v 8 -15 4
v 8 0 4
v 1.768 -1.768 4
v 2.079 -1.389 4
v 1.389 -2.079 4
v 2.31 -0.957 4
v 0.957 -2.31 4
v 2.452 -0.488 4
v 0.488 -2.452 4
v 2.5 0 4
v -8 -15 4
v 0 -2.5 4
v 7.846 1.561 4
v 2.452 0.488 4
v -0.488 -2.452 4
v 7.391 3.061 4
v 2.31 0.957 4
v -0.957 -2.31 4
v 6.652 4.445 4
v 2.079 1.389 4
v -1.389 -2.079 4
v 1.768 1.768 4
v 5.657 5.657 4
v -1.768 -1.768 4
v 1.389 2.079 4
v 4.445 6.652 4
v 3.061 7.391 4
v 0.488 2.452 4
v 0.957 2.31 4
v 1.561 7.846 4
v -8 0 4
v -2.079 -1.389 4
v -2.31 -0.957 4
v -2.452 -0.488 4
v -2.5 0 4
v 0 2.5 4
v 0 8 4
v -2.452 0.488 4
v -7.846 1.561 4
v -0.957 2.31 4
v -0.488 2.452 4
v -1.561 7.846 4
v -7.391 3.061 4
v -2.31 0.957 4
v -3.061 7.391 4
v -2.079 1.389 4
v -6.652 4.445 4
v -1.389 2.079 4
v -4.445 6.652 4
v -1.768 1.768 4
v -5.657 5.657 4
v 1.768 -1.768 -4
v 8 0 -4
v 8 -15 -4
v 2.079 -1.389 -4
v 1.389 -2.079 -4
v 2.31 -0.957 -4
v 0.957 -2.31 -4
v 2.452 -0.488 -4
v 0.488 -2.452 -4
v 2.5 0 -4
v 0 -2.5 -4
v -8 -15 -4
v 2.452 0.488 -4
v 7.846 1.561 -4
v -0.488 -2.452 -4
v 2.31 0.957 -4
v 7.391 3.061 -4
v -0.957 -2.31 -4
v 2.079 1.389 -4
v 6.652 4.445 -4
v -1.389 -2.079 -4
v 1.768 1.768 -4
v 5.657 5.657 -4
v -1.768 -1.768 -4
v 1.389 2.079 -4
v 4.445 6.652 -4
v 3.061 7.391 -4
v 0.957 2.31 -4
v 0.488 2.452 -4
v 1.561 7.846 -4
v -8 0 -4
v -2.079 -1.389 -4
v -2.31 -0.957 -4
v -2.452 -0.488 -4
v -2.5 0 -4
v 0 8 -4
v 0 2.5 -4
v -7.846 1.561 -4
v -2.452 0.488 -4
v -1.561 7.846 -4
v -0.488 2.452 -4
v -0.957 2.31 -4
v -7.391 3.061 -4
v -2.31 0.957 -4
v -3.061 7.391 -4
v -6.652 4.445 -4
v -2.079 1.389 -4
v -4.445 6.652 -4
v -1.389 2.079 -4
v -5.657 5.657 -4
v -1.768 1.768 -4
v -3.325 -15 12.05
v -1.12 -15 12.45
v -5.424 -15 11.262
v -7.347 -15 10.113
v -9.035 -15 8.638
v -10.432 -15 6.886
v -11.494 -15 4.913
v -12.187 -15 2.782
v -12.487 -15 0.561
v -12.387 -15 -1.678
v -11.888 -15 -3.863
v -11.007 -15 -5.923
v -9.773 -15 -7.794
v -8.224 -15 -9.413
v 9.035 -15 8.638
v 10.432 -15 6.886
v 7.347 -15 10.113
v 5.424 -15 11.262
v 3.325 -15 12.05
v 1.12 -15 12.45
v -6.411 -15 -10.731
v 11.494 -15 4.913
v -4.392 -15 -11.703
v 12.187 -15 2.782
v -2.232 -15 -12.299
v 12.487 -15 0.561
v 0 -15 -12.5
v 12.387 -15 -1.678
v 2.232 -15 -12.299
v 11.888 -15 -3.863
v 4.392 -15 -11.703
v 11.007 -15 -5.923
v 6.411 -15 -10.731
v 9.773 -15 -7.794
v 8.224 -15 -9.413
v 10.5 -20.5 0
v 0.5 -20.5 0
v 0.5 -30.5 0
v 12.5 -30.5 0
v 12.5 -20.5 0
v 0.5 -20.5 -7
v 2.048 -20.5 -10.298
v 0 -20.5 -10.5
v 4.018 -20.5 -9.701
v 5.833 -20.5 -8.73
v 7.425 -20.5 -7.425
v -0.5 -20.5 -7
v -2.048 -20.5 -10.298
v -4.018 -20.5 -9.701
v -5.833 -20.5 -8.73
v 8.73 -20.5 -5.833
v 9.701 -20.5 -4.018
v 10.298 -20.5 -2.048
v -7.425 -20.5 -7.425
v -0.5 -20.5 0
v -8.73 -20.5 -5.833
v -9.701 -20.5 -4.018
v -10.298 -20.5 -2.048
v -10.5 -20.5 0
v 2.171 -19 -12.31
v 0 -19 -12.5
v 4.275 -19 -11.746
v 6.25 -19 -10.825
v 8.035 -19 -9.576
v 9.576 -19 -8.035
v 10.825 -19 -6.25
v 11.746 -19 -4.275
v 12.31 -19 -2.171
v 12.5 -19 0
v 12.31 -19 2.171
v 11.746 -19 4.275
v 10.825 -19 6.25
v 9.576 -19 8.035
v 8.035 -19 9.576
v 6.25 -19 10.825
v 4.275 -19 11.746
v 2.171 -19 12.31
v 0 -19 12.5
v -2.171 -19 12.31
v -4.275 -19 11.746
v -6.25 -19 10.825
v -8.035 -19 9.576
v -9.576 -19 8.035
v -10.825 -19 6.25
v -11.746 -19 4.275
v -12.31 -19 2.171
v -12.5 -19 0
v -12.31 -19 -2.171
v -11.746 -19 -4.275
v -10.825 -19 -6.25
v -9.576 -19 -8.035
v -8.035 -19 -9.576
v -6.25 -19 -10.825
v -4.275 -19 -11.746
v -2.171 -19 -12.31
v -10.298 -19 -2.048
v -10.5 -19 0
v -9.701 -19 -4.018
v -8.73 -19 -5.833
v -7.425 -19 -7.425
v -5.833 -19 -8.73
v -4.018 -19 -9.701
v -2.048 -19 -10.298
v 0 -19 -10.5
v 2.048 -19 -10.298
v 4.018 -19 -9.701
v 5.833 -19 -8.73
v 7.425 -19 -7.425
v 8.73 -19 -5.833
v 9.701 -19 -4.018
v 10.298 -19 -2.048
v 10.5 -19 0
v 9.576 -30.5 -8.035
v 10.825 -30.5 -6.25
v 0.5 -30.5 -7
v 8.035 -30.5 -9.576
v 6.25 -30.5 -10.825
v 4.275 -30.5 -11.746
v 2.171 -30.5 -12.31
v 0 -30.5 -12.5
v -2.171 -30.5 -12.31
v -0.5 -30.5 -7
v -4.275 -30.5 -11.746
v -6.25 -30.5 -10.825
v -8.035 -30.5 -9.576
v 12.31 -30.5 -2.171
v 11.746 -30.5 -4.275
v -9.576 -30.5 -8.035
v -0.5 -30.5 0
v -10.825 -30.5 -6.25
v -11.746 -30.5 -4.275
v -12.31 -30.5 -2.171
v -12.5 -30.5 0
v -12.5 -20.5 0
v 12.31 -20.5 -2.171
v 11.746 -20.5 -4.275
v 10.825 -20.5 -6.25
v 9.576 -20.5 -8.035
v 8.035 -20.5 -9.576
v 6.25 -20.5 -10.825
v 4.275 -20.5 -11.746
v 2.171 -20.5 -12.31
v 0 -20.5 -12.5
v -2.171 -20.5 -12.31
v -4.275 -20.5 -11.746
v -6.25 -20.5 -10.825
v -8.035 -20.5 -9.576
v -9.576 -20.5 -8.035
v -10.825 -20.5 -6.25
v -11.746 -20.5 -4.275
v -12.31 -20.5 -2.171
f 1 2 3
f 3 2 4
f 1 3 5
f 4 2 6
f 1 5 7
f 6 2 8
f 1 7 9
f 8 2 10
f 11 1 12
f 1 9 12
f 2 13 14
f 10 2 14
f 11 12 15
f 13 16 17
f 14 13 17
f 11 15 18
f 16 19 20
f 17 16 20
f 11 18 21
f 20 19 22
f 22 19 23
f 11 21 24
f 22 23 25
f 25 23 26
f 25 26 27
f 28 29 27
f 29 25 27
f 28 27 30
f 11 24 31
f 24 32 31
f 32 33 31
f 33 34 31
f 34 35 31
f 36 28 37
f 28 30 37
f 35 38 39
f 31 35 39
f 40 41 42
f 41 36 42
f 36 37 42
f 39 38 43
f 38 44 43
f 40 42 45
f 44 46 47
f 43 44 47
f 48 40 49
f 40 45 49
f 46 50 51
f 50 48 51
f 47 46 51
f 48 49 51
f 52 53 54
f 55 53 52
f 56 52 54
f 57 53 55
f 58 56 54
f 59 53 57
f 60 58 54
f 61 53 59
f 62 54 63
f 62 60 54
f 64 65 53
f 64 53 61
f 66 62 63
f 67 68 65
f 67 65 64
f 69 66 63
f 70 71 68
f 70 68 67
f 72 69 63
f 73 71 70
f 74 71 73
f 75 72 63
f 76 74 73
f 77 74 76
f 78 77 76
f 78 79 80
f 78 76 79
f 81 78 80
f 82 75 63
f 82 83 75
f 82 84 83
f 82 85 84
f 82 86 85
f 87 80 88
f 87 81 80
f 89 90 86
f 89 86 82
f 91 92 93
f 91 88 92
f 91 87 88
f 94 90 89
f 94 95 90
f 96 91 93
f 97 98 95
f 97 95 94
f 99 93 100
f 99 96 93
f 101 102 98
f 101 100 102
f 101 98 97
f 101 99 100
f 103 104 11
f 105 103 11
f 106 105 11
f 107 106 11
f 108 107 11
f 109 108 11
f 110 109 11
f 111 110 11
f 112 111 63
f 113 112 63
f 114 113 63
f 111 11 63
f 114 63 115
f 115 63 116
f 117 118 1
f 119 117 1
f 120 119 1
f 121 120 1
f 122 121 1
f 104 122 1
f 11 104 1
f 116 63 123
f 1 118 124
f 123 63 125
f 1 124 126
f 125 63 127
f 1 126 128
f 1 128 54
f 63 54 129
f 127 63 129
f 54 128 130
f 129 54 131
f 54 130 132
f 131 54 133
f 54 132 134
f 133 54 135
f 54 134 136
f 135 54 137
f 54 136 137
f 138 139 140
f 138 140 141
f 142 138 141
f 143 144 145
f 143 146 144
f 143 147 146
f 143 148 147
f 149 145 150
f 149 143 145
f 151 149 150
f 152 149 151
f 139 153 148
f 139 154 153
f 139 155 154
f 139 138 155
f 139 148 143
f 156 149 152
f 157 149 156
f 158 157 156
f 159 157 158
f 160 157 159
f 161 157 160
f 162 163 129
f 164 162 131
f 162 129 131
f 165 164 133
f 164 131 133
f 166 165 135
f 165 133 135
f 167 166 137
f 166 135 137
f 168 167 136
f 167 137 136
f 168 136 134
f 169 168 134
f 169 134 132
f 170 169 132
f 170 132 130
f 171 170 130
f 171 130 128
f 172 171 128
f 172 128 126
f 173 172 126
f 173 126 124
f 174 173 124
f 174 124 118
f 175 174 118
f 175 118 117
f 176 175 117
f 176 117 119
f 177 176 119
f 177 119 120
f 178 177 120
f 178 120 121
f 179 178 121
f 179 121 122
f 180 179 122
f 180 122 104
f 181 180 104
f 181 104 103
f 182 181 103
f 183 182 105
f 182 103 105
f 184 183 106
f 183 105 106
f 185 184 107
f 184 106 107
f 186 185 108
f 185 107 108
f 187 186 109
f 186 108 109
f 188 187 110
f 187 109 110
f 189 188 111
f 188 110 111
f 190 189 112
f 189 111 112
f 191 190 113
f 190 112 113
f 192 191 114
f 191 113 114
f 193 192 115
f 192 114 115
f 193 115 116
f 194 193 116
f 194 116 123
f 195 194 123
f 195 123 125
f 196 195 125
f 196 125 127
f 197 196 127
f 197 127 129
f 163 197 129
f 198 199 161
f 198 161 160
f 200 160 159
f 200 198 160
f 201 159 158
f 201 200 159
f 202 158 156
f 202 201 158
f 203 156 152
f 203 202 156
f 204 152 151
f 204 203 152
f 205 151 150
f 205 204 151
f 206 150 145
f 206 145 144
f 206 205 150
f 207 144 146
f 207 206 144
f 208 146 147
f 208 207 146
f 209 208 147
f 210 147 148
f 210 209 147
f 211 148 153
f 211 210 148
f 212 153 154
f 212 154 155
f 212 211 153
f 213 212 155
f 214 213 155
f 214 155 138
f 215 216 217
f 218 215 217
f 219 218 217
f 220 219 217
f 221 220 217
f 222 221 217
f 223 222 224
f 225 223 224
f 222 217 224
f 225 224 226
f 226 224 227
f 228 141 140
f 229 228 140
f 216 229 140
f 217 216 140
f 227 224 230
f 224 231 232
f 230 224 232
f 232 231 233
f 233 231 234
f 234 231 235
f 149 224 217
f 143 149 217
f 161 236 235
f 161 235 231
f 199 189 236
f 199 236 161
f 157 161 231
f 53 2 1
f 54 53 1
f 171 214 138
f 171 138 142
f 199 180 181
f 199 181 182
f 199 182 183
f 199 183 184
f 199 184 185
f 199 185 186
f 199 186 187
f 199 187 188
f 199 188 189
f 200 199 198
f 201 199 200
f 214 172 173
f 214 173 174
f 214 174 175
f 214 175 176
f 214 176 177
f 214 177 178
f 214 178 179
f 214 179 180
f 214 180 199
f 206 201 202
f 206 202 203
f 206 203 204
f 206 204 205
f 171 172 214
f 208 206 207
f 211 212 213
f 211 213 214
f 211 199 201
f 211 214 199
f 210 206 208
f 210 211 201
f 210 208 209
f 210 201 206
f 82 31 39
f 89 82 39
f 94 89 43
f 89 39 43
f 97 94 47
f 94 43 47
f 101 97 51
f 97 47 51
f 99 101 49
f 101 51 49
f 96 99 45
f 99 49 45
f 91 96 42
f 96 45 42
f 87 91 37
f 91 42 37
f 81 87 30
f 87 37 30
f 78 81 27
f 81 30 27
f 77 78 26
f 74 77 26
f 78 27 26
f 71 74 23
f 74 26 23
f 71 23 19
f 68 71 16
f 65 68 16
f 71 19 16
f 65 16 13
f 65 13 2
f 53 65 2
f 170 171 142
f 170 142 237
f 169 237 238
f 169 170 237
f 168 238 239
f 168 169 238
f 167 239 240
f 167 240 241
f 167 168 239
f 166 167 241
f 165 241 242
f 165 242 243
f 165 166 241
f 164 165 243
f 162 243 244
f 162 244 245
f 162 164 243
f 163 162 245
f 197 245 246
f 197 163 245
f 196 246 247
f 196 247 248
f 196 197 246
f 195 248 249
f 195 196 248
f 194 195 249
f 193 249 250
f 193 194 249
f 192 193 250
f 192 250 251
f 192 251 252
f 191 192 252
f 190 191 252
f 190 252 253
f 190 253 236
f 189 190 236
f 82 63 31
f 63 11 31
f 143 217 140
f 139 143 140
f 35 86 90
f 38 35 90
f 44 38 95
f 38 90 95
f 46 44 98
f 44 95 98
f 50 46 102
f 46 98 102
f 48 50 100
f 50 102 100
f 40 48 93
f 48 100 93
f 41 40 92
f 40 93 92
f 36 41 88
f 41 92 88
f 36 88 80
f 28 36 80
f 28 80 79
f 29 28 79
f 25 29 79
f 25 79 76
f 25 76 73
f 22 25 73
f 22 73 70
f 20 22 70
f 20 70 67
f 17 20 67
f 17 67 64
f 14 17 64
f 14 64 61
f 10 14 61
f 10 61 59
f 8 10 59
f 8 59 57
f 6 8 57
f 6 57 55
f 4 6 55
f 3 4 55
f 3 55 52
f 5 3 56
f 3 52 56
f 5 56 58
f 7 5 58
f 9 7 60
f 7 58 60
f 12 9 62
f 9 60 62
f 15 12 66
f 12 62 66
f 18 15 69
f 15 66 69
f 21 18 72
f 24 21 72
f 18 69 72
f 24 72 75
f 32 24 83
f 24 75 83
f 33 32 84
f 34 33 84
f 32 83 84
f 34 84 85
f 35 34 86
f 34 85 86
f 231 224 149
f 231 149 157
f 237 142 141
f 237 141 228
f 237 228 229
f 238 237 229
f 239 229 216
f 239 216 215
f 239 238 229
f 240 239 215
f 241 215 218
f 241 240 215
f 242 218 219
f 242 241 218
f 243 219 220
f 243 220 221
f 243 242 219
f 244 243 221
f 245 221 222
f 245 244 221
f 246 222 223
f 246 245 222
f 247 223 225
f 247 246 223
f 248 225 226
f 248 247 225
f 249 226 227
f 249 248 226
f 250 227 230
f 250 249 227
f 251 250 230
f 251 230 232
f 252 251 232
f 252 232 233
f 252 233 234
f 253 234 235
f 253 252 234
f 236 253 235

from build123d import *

# Parameters (mm, degrees)
BOSS_EXTRUDE2_DEPTH = 4
SKETCH4_R           = 2.5
CUT_EXTRUDE1_DEPTH  = 19.788294228
SKETCH6_R           = 12.5
BOSS_EXTRUDE3_DEPTH = 4
BOSS_EXTRUDE4_DEPTH = 1.5
BOSS_EXTRUDE5_DEPTH = 10
CUT_EXTRUDE2_REACH  = 44.364
SKETCH9_W           = 1
SKETCH9_H           = 7


with BuildPart() as part:
    # Sketch3 → Boss-Extrude2 (new, symmetric)
    with BuildSketch(Plane.XY):
        with BuildLine():
            Line((8, 0), (8, -15))
            Line((8, -15), (-8, -15))
            Line((-8, -15), (-8, 0))
            ThreePointArc((-8, 0), (0, 8), (8, 0))
        make_face()
    extrude(amount=BOSS_EXTRUDE2_DEPTH, both=True)

    # Sketch4 → Cut-Extrude1 (cut, through all)
    with BuildSketch(Plane(origin=(0, 0, -4), x_dir=(-1, 0, 0), z_dir=(0, 0, -1))):
        Circle(SKETCH4_R)
    extrude(amount=-CUT_EXTRUDE1_DEPTH, mode=Mode.SUBTRACT)

    # Sketch6 → Boss-Extrude3 (add)
    with BuildSketch(Plane.XZ.offset(15)):
        Circle(SKETCH6_R)
    extrude(amount=BOSS_EXTRUDE3_DEPTH)

    # Sketch7 → Boss-Extrude4 (add)
    with BuildSketch(Plane.XZ.offset(19)):
        with BuildLine():
            Line((-12.5, 0), (-10.5, 0))
            ThreePointArc((-10.5, 0), (0, -10.5), (10.5, 0))
            Line((10.5, 0), (12.5, 0))
            ThreePointArc((12.5, 0), (0, -12.5), (-12.5, 0))
        make_face()
    extrude(amount=BOSS_EXTRUDE4_DEPTH)

    # Sketch8 → Boss-Extrude5 (add)
    with BuildSketch(Plane.XZ.offset(20.5)):
        with BuildLine():
            Line((-12.5, 0), (12.5, 0))
            ThreePointArc((12.5, 0), (0, -12.5), (-12.5, 0))
        make_face()
    extrude(amount=BOSS_EXTRUDE5_DEPTH)

    # Sketch9 → Cut-Extrude2 (cut, up to next)
    with BuildSketch(Plane.XZ.offset(30.5), mode=Mode.PRIVATE) as cut_extrude2_sk1:
        with Locations((0, -3.5)):
            Rectangle(SKETCH9_W, SKETCH9_H)
    cut_extrude2_tool1 = extrude(cut_extrude2_sk1.sketch, amount=-CUT_EXTRUDE2_REACH, mode=Mode.PRIVATE) & part.part
    add(cut_extrude2_tool1.solids().sort_by_distance((0, -30.5, -3.5))[0], mode=Mode.SUBTRACT)


solid = part.part
